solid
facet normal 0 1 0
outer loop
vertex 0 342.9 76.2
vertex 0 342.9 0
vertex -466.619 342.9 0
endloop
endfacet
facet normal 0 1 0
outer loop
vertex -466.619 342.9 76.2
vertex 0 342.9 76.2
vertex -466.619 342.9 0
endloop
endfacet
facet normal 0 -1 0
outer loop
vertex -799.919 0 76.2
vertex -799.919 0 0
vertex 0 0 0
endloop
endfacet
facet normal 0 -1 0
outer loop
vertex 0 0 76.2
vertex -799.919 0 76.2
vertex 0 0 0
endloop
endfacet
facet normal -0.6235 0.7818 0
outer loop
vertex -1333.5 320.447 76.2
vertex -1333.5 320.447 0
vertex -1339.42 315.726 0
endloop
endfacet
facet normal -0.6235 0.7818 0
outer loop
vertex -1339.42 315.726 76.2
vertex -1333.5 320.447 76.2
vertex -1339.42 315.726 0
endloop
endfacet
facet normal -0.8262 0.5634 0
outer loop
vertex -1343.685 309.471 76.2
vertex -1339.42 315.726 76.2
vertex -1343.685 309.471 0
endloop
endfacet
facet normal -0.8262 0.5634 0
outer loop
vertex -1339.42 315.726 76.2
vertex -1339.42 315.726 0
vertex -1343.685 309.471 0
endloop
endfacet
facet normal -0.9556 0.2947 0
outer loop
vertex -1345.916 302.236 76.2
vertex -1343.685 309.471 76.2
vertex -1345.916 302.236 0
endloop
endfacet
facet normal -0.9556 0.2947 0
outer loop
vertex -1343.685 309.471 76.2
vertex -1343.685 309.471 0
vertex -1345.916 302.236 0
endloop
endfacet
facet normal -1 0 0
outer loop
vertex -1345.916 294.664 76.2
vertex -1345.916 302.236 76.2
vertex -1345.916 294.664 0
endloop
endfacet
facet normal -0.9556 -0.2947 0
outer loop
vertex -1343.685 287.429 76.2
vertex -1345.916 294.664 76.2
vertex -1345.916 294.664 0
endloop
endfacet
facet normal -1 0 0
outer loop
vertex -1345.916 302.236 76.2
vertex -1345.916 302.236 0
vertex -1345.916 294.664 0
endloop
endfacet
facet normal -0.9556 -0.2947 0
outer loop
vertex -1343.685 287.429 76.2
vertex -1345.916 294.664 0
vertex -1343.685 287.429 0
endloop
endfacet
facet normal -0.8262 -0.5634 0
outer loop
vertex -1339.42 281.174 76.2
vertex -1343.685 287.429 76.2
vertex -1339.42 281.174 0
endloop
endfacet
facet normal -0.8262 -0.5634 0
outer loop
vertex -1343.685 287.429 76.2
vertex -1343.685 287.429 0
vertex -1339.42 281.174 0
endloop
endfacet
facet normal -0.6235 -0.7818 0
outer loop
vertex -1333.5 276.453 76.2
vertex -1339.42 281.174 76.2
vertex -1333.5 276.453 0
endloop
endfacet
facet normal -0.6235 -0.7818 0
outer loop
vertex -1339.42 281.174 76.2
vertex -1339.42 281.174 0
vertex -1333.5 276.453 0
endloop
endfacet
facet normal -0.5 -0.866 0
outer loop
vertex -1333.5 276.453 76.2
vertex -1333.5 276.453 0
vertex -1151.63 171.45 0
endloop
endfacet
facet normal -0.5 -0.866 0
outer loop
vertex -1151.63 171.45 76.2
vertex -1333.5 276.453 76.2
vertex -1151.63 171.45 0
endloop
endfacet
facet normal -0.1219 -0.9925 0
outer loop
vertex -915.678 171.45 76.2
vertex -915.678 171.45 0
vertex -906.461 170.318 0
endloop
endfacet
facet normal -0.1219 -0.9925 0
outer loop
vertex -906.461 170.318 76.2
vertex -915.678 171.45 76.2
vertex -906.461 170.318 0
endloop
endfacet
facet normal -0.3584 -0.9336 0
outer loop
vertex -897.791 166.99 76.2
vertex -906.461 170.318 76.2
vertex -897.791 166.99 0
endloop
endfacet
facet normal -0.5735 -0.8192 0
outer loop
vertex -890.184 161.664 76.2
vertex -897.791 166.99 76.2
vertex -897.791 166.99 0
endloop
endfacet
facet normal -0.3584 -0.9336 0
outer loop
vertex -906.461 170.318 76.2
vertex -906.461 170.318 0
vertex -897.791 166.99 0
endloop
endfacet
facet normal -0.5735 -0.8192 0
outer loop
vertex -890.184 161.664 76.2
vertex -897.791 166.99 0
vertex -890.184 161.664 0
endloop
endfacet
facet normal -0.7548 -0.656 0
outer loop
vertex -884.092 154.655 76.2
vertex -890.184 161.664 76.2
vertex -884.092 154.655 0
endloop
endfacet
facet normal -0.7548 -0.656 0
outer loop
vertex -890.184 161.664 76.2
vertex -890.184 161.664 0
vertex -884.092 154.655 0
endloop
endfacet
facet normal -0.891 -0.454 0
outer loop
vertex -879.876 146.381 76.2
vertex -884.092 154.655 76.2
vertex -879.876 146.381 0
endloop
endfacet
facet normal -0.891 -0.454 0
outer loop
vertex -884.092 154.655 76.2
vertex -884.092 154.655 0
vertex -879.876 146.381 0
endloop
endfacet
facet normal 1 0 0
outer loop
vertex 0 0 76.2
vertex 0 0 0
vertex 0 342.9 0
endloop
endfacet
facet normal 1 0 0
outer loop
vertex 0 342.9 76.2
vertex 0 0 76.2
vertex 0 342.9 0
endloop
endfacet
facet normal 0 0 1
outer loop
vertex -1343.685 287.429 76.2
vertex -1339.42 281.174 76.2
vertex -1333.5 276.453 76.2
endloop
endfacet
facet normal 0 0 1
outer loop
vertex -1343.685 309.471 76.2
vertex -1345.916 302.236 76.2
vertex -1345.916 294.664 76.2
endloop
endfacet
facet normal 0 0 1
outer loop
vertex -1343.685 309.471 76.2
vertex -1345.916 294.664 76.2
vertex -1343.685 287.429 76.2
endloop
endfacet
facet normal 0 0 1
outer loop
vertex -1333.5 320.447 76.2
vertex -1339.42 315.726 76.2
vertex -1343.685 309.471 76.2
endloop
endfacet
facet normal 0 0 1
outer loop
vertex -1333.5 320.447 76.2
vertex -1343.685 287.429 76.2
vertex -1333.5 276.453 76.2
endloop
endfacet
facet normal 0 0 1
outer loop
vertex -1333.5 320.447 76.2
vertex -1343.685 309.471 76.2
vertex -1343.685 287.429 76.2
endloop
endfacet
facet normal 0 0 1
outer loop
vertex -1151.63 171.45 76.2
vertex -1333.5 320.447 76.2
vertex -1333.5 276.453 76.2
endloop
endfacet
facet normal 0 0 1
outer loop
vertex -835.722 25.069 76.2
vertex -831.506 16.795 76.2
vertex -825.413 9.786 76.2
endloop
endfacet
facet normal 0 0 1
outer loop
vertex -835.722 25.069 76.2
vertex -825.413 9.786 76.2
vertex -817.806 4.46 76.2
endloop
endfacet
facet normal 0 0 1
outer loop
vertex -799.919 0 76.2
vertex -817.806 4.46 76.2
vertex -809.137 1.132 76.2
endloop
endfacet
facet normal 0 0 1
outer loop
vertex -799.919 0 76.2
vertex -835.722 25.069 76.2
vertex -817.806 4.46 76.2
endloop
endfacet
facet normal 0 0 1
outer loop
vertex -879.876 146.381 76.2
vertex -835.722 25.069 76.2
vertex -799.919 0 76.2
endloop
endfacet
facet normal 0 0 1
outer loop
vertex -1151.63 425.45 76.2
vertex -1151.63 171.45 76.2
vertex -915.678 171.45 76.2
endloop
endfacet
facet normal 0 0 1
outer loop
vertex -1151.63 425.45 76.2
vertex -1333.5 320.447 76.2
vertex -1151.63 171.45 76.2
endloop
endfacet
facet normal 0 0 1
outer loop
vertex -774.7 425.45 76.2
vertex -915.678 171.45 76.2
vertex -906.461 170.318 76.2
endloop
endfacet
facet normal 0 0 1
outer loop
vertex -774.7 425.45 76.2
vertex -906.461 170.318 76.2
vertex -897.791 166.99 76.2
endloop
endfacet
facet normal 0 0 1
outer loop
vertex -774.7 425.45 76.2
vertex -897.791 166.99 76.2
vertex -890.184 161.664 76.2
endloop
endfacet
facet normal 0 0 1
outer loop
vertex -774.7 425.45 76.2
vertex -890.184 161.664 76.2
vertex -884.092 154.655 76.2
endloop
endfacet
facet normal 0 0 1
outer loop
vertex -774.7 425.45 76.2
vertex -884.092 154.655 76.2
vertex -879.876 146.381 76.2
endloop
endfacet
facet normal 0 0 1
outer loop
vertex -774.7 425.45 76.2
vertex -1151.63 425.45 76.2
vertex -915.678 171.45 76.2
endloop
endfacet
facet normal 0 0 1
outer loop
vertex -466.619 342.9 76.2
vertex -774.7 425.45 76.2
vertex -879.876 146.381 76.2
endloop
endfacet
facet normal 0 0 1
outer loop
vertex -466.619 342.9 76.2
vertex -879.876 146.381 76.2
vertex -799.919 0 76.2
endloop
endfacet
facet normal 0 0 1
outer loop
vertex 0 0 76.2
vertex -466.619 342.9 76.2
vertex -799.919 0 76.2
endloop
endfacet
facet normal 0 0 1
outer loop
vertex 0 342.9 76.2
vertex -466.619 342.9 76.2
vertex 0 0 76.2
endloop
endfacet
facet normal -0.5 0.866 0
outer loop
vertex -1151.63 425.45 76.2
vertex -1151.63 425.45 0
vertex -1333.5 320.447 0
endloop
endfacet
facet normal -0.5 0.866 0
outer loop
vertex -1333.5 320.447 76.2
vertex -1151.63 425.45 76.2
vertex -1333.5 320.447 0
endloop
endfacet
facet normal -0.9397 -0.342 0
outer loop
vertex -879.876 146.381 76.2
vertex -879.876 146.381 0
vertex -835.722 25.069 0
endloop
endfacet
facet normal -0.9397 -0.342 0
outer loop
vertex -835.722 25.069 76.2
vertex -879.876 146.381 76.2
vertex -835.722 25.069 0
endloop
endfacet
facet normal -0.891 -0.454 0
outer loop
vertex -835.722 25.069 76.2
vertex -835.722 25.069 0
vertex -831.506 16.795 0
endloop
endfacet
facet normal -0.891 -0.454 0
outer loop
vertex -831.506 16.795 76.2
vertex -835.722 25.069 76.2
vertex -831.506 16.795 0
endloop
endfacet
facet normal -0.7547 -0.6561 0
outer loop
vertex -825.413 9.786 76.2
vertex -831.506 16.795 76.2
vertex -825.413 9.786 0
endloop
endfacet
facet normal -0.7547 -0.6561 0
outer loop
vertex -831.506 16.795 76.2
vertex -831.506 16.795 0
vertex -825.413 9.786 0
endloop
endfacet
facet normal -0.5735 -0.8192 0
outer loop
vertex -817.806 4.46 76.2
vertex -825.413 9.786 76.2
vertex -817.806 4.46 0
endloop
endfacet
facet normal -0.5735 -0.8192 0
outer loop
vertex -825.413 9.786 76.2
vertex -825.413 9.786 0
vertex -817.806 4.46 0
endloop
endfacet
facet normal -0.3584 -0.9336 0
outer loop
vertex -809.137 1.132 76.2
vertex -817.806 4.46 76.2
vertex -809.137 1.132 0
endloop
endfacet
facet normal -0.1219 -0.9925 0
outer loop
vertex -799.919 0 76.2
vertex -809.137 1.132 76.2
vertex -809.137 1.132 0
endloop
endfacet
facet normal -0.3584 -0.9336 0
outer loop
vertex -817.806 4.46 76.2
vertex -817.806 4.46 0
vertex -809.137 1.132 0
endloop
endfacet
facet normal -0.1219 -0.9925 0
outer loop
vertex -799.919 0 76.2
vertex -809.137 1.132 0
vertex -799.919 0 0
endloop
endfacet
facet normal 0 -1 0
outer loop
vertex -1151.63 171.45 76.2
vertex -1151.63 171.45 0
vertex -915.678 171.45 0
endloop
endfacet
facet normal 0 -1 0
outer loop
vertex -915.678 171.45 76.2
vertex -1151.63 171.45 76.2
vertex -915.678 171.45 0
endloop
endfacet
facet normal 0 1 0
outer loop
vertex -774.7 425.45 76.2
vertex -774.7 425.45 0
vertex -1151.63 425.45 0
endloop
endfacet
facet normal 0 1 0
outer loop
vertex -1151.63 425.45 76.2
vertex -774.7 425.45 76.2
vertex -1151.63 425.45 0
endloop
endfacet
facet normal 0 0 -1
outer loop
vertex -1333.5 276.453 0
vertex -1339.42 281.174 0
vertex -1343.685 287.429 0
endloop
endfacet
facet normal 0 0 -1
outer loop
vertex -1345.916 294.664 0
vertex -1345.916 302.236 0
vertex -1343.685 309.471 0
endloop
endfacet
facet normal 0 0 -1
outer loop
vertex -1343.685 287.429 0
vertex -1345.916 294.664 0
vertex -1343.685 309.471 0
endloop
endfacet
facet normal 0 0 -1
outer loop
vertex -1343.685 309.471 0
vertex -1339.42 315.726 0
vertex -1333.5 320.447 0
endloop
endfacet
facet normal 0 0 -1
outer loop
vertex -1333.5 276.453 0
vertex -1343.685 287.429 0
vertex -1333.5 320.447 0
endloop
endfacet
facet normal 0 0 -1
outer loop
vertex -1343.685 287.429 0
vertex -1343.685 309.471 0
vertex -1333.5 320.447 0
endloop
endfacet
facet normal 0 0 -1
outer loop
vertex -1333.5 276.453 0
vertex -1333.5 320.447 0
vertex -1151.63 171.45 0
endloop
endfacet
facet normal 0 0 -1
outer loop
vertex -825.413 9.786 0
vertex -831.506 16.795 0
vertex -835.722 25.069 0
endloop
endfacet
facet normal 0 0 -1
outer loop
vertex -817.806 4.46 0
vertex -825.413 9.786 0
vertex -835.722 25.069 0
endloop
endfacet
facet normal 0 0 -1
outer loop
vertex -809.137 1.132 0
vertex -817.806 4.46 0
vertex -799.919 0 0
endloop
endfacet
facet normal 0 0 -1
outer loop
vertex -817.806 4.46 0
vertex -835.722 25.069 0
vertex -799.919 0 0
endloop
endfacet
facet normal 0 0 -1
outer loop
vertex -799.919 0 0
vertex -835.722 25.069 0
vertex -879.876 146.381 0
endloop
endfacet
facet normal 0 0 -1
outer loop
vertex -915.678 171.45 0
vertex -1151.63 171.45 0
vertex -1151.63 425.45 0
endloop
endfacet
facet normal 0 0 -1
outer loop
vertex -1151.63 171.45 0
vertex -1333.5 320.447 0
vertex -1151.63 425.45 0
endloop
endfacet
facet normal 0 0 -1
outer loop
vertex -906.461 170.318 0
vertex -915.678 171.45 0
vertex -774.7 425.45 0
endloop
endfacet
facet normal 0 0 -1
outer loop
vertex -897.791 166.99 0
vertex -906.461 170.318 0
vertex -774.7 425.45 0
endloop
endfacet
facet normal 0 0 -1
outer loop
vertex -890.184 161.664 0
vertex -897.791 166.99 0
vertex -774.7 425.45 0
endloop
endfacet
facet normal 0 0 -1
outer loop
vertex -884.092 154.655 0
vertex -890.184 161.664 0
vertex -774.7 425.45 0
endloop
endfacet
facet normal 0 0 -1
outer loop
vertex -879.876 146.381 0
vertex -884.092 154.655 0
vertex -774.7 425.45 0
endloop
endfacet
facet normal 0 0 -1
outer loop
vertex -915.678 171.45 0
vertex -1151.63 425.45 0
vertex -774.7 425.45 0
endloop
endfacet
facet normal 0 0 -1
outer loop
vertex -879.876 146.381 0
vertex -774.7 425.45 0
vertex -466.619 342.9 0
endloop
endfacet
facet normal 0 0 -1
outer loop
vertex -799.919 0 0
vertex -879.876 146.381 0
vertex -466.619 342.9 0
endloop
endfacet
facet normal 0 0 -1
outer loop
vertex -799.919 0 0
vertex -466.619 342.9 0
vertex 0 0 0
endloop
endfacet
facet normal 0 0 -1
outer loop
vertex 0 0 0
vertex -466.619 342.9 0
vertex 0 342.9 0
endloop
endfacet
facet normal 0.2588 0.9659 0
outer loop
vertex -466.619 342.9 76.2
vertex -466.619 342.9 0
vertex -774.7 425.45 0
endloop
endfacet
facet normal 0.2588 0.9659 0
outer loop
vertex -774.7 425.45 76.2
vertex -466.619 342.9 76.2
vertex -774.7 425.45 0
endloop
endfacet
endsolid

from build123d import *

# Parameters (mm, degrees)
F1_DEPTH = 76.2


with BuildPart() as f1:
    # F0 (on Top) → F1 (new body)
    with BuildSketch(Plane.XY):
        with BuildLine():
            Line((-799.919396, 0), (0, 0))
            Line((0, 0), (0, 342.9))
            Line((0, 342.9), (-466.619206, 342.9))
            Line((-466.619206, 342.9), (-774.7, 425.45))
            Line((-774.7, 425.45), (-1151.629547, 425.45))
            Line((-1151.629547, 425.45), (-1333.5, 320.447045))
            ThreePointArc((-1333.5, 320.447045), (-1346.2, 298.45), (-1333.5, 276.452955))
            Line((-1333.5, 276.452955), (-1151.629547, 171.45))
            Line((-1151.629547, 171.45), (-915.677907, 171.45))
            ThreePointArc((-915.677907, 171.45), (-893.824645, 164.559693), (-879.875618, 146.380967))
            Line((-879.875618, 146.380967), (-835.721685, 25.069033))
            ThreePointArc((-835.721685, 25.069033), (-821.772658, 6.890307), (-799.919396, 0))
        make_face()
    extrude(amount=F1_DEPTH)


solid = f1.part
